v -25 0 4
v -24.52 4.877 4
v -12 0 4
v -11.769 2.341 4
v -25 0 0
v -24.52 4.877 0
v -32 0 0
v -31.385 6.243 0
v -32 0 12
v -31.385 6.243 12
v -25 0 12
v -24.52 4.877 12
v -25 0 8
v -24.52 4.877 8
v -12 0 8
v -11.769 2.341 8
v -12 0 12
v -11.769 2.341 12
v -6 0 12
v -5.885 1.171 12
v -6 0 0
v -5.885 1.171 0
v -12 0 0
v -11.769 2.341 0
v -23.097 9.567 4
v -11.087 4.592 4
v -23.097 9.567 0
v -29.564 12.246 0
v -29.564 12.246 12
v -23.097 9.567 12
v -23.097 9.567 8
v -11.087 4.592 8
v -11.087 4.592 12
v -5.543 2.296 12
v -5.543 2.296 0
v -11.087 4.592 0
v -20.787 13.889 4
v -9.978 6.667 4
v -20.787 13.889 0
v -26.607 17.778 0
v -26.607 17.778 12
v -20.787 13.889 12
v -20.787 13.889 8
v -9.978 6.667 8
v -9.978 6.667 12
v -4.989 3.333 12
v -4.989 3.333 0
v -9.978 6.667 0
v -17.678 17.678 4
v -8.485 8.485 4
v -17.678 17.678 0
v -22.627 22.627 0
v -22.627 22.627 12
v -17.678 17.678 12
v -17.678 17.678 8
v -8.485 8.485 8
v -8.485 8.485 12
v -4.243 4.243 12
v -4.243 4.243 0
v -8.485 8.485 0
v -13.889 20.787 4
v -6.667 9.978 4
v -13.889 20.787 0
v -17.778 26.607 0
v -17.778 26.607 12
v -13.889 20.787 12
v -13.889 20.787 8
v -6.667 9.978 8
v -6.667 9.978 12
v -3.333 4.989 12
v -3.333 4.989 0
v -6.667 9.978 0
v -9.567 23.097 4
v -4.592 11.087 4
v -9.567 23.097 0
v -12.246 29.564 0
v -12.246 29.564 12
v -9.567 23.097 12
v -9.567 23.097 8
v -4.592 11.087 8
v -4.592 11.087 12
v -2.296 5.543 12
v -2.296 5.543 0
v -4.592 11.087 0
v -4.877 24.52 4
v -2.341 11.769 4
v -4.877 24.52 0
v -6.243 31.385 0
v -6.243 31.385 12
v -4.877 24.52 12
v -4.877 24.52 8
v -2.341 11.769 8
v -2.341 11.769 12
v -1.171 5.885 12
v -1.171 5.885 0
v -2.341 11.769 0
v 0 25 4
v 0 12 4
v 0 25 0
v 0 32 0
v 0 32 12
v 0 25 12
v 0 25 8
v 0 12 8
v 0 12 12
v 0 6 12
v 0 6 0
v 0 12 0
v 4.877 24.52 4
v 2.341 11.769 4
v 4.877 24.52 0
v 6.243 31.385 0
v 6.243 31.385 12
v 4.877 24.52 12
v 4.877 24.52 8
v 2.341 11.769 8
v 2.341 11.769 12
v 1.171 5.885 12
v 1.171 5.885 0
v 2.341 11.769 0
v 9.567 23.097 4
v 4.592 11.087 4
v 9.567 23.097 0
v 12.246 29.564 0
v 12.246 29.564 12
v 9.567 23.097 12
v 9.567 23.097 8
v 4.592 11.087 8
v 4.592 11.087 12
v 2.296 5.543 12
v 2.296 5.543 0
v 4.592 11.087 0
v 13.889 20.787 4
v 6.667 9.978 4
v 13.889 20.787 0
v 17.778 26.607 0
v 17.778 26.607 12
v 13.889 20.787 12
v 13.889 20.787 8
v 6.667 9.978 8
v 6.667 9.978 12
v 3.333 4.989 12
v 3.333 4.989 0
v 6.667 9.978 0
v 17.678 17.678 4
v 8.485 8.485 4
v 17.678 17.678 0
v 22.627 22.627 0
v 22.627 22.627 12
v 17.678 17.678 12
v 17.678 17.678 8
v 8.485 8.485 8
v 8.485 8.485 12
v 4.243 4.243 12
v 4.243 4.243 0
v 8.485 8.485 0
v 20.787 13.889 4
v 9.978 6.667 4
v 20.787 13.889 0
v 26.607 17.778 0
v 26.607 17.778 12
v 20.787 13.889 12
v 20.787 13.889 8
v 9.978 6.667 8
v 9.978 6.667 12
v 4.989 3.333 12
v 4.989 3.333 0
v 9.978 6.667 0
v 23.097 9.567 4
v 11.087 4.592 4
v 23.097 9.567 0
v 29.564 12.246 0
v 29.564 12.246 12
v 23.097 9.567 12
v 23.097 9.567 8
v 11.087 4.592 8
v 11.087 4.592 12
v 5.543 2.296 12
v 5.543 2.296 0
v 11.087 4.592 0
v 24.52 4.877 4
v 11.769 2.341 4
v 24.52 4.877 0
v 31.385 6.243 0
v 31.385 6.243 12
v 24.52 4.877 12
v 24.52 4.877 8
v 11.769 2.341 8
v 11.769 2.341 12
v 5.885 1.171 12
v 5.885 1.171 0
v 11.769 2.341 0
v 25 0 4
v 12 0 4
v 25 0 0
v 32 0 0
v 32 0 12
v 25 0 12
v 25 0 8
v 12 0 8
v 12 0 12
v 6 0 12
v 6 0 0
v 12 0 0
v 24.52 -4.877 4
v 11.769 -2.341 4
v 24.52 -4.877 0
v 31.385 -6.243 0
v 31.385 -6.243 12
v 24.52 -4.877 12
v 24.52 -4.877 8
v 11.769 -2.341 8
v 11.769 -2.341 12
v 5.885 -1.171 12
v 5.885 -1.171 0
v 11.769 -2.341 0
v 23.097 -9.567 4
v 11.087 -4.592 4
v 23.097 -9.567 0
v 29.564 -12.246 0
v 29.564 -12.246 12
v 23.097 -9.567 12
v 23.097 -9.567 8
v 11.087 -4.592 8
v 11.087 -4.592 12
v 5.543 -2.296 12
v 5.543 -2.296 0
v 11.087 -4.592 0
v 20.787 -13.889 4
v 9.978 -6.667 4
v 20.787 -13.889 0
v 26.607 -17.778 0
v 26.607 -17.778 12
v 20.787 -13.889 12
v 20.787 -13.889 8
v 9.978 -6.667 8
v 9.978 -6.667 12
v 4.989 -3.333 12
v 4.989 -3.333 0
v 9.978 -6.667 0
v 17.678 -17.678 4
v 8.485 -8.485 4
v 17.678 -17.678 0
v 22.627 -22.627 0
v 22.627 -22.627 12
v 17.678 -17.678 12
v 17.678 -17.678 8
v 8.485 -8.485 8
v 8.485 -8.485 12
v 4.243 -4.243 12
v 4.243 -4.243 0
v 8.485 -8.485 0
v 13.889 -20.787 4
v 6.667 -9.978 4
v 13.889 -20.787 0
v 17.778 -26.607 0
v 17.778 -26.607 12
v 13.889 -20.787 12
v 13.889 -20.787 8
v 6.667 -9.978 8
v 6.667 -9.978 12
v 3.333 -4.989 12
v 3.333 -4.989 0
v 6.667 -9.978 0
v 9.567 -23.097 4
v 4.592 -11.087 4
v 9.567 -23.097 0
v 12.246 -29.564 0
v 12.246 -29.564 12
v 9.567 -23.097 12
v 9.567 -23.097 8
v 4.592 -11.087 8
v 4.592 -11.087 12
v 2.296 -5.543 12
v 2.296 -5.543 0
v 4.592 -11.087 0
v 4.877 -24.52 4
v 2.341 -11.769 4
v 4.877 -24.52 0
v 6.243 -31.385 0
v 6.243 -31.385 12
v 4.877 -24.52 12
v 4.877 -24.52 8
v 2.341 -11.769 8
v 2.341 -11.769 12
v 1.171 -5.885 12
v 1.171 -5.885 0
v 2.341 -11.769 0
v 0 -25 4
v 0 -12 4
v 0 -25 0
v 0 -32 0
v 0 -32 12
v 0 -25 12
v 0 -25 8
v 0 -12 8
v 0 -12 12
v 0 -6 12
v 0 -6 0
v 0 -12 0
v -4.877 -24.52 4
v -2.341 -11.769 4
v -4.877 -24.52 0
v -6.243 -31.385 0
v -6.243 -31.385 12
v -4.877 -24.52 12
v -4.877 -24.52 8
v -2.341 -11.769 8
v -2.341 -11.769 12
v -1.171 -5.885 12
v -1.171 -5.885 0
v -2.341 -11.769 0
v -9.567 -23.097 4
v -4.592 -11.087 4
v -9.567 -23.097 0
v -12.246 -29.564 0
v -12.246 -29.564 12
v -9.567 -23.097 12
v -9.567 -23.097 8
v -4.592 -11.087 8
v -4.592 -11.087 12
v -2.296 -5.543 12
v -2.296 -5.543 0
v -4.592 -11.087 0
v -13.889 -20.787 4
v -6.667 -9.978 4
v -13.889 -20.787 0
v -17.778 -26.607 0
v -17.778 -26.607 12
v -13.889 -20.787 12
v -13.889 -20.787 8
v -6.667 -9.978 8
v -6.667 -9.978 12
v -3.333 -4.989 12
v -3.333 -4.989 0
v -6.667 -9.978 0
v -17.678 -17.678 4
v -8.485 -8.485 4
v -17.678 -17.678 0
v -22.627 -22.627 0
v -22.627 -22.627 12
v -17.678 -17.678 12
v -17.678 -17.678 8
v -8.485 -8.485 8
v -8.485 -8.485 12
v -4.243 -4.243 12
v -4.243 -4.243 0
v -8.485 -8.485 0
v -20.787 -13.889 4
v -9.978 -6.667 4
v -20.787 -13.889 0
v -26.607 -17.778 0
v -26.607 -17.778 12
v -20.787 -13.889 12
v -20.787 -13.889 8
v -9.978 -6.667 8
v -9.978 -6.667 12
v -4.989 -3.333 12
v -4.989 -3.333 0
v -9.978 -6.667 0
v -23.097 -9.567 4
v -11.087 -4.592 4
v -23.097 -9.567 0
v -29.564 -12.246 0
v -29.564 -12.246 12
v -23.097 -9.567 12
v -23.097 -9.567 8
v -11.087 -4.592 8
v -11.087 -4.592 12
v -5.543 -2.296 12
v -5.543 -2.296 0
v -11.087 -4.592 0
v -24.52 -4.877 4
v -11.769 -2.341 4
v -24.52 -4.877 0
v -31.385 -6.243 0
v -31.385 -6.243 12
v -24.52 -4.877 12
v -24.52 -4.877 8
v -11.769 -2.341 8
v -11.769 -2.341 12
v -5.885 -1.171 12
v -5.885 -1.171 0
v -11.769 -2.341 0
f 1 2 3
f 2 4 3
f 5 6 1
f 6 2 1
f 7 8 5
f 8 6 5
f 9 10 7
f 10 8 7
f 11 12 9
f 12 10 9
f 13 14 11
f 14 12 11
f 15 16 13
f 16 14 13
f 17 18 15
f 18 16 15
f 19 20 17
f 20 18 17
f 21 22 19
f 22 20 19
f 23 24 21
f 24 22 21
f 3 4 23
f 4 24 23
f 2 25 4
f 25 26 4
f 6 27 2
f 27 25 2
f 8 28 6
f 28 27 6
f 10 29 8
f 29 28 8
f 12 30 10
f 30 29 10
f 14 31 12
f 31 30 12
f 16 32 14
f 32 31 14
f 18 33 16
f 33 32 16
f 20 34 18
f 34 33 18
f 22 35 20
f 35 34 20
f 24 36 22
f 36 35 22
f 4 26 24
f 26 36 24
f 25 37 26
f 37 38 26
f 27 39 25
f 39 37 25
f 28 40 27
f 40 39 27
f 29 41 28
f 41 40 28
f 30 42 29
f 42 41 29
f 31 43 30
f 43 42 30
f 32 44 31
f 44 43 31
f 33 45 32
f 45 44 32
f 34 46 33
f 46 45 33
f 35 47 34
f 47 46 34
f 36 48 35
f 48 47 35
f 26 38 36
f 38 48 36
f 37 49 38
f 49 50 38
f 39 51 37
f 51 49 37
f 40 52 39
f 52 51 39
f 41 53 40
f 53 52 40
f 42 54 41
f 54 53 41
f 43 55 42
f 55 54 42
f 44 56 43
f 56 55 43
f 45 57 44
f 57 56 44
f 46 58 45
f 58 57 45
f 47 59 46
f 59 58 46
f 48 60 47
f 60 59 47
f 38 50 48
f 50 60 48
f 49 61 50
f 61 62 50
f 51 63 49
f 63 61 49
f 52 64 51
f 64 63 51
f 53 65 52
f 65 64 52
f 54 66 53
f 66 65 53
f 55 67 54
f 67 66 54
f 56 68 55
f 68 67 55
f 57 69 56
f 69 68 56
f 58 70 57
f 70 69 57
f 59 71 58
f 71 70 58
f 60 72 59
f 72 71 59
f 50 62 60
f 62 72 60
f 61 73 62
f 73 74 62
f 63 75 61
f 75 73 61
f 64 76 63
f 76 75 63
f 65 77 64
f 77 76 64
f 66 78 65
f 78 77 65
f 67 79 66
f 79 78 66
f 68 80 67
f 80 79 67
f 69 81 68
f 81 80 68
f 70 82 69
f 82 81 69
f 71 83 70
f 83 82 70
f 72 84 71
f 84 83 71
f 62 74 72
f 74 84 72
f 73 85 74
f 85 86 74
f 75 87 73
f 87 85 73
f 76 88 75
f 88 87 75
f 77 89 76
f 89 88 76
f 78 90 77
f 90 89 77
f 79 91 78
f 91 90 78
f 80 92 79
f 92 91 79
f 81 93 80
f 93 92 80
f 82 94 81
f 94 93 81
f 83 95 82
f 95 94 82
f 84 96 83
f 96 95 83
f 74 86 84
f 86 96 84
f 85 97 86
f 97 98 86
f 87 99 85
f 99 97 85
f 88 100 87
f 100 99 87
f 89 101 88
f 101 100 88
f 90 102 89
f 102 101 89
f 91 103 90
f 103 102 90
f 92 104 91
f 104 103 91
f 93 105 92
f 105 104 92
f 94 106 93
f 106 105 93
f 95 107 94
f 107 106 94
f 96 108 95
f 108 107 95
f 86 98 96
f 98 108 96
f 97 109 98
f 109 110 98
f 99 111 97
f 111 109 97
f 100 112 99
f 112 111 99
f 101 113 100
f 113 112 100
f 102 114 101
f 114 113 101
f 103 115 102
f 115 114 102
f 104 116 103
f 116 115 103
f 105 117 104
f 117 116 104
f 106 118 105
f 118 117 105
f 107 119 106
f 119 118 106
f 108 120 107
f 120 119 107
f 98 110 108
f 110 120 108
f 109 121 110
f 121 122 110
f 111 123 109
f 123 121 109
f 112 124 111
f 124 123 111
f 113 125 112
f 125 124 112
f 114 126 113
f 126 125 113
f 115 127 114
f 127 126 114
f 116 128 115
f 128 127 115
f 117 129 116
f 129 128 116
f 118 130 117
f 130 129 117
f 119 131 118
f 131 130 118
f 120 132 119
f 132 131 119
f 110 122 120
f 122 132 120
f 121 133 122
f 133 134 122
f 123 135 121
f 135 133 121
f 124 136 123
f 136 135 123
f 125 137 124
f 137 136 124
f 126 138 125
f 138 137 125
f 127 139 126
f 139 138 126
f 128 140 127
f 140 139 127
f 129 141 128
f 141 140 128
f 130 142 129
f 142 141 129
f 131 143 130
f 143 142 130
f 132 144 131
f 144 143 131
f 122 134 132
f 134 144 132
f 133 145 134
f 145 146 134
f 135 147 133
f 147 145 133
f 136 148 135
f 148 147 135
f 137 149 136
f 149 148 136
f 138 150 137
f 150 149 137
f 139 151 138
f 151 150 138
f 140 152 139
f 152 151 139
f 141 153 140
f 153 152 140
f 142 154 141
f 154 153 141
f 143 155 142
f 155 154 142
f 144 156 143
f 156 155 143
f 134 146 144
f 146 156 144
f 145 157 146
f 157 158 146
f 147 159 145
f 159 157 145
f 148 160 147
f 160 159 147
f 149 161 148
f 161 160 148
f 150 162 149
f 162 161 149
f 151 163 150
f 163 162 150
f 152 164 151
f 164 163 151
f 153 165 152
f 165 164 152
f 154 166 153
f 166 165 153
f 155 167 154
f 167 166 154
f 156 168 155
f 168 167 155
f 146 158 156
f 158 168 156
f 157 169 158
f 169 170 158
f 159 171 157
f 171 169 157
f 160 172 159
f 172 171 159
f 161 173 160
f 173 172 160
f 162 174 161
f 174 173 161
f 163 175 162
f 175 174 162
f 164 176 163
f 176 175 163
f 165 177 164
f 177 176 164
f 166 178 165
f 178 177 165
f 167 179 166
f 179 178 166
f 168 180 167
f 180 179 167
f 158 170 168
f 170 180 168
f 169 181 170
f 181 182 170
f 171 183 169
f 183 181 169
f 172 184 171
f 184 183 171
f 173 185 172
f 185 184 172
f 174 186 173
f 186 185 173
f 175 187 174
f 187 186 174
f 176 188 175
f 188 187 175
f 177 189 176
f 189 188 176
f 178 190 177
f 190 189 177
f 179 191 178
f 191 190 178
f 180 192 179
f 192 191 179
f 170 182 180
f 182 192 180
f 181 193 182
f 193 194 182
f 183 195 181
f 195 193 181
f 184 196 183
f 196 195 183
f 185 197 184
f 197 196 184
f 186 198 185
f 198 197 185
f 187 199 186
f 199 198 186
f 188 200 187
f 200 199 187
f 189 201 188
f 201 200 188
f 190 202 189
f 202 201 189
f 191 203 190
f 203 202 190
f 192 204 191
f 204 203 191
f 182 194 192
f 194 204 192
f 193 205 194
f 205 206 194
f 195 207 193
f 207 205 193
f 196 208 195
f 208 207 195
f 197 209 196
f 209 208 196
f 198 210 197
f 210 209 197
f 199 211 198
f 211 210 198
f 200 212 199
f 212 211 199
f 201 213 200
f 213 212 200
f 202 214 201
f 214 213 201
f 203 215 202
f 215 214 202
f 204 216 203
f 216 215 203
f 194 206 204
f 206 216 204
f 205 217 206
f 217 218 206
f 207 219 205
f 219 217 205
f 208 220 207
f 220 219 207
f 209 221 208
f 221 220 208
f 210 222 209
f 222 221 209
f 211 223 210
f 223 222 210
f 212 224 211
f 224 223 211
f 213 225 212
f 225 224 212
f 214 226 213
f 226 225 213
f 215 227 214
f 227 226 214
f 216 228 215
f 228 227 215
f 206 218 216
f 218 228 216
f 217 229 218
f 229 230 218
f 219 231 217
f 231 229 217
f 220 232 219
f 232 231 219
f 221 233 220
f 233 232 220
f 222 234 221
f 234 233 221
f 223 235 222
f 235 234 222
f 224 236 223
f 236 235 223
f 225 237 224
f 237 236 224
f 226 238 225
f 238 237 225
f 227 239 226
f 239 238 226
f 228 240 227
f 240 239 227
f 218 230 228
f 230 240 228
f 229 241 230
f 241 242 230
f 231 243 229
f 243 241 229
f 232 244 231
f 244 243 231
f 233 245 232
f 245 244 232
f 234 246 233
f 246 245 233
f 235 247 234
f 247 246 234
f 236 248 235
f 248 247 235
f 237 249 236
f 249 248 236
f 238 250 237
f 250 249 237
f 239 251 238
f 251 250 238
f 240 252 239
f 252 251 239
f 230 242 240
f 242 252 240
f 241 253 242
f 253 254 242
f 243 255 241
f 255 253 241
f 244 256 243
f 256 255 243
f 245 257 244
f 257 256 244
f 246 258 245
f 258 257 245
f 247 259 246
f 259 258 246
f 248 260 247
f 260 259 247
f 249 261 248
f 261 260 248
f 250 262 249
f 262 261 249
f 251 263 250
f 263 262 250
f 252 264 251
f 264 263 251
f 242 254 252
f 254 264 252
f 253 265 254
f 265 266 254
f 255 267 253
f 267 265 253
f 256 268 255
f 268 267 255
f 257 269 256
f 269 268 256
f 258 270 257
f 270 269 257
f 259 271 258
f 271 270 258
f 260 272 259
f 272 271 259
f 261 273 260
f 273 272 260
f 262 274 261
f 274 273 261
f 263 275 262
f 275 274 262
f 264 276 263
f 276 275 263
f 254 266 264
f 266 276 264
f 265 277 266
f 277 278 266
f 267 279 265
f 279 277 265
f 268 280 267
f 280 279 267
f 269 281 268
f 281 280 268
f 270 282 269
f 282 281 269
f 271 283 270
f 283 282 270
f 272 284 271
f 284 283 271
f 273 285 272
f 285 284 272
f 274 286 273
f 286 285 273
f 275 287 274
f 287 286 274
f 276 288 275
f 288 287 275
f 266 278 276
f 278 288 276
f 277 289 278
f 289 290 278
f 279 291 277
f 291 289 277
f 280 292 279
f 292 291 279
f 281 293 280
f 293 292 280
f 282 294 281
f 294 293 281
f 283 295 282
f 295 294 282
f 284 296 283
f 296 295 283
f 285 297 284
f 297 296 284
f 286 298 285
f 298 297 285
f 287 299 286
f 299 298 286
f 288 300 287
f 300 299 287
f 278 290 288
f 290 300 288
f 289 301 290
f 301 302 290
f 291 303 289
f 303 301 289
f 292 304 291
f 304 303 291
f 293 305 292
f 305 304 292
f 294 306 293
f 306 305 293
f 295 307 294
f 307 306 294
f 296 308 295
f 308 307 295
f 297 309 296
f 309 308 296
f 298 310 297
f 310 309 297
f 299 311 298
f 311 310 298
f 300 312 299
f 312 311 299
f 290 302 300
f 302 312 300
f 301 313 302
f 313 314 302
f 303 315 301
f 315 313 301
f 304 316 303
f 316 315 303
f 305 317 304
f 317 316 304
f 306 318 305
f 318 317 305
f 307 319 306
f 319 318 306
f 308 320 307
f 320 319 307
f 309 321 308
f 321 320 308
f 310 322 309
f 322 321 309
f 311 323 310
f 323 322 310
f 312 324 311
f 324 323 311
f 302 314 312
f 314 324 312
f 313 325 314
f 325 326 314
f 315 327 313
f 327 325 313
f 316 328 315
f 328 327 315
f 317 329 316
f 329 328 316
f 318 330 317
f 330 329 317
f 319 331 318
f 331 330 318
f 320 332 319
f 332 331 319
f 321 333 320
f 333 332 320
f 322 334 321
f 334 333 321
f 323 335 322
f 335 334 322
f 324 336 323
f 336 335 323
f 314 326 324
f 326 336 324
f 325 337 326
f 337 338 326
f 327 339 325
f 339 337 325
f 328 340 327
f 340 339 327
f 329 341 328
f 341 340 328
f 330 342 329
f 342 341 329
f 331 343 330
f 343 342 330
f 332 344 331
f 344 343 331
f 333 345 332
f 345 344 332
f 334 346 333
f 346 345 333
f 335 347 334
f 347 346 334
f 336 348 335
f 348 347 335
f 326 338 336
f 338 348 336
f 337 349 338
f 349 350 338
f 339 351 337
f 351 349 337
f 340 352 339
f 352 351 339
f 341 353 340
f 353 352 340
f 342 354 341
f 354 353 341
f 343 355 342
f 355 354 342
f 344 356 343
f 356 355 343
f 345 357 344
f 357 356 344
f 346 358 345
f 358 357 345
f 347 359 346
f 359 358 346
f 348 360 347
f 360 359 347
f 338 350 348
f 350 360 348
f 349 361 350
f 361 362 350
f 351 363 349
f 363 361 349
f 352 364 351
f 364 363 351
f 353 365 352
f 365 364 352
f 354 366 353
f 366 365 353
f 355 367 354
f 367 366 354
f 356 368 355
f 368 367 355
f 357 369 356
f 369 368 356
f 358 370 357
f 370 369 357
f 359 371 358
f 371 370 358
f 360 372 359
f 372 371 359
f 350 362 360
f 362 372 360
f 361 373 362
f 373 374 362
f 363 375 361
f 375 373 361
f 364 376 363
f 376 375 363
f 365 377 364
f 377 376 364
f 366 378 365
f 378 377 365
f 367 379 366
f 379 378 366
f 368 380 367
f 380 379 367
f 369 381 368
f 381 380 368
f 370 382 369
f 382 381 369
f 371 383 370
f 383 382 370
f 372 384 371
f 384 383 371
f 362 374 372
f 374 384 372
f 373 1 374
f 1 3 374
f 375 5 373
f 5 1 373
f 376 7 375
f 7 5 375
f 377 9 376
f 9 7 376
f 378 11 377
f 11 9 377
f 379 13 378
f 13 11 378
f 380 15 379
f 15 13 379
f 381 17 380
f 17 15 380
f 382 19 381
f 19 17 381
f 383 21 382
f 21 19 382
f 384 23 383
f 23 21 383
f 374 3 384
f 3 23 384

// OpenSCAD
$fn = 32;

// ----------------------------------------------------------------------
// Revolved part: handwheel R32
// ----------------------------------------------------------------------

// --- parameters (mm) ---
bore_r = 6;               // bore radius
rim_r = 32;               // rim radius
rim_w = 7;                // rim axial width
rim_t = 12;               // rim diameter height
hub_r = 12;               // hub radius
web_t = 4;                // web thickness
revolve_angle = 360;      // revolve sweep, degrees

bore_d = 2 * bore_r;
rim_d = 2 * rim_r;
hub_d = 2 * hub_r;

profile = [[6, 0], [12, 0], [12, 4], [25, 4], [25, 0], [32, 0], [32, 12], [25, 12], [25, 8], [12, 8], [12, 12], [6, 12]];  // primary outline, 12 points, counter clockwise

// --- the one profile operation ---
rotate_extrude(angle = revolve_angle) polygon(points = profile);
